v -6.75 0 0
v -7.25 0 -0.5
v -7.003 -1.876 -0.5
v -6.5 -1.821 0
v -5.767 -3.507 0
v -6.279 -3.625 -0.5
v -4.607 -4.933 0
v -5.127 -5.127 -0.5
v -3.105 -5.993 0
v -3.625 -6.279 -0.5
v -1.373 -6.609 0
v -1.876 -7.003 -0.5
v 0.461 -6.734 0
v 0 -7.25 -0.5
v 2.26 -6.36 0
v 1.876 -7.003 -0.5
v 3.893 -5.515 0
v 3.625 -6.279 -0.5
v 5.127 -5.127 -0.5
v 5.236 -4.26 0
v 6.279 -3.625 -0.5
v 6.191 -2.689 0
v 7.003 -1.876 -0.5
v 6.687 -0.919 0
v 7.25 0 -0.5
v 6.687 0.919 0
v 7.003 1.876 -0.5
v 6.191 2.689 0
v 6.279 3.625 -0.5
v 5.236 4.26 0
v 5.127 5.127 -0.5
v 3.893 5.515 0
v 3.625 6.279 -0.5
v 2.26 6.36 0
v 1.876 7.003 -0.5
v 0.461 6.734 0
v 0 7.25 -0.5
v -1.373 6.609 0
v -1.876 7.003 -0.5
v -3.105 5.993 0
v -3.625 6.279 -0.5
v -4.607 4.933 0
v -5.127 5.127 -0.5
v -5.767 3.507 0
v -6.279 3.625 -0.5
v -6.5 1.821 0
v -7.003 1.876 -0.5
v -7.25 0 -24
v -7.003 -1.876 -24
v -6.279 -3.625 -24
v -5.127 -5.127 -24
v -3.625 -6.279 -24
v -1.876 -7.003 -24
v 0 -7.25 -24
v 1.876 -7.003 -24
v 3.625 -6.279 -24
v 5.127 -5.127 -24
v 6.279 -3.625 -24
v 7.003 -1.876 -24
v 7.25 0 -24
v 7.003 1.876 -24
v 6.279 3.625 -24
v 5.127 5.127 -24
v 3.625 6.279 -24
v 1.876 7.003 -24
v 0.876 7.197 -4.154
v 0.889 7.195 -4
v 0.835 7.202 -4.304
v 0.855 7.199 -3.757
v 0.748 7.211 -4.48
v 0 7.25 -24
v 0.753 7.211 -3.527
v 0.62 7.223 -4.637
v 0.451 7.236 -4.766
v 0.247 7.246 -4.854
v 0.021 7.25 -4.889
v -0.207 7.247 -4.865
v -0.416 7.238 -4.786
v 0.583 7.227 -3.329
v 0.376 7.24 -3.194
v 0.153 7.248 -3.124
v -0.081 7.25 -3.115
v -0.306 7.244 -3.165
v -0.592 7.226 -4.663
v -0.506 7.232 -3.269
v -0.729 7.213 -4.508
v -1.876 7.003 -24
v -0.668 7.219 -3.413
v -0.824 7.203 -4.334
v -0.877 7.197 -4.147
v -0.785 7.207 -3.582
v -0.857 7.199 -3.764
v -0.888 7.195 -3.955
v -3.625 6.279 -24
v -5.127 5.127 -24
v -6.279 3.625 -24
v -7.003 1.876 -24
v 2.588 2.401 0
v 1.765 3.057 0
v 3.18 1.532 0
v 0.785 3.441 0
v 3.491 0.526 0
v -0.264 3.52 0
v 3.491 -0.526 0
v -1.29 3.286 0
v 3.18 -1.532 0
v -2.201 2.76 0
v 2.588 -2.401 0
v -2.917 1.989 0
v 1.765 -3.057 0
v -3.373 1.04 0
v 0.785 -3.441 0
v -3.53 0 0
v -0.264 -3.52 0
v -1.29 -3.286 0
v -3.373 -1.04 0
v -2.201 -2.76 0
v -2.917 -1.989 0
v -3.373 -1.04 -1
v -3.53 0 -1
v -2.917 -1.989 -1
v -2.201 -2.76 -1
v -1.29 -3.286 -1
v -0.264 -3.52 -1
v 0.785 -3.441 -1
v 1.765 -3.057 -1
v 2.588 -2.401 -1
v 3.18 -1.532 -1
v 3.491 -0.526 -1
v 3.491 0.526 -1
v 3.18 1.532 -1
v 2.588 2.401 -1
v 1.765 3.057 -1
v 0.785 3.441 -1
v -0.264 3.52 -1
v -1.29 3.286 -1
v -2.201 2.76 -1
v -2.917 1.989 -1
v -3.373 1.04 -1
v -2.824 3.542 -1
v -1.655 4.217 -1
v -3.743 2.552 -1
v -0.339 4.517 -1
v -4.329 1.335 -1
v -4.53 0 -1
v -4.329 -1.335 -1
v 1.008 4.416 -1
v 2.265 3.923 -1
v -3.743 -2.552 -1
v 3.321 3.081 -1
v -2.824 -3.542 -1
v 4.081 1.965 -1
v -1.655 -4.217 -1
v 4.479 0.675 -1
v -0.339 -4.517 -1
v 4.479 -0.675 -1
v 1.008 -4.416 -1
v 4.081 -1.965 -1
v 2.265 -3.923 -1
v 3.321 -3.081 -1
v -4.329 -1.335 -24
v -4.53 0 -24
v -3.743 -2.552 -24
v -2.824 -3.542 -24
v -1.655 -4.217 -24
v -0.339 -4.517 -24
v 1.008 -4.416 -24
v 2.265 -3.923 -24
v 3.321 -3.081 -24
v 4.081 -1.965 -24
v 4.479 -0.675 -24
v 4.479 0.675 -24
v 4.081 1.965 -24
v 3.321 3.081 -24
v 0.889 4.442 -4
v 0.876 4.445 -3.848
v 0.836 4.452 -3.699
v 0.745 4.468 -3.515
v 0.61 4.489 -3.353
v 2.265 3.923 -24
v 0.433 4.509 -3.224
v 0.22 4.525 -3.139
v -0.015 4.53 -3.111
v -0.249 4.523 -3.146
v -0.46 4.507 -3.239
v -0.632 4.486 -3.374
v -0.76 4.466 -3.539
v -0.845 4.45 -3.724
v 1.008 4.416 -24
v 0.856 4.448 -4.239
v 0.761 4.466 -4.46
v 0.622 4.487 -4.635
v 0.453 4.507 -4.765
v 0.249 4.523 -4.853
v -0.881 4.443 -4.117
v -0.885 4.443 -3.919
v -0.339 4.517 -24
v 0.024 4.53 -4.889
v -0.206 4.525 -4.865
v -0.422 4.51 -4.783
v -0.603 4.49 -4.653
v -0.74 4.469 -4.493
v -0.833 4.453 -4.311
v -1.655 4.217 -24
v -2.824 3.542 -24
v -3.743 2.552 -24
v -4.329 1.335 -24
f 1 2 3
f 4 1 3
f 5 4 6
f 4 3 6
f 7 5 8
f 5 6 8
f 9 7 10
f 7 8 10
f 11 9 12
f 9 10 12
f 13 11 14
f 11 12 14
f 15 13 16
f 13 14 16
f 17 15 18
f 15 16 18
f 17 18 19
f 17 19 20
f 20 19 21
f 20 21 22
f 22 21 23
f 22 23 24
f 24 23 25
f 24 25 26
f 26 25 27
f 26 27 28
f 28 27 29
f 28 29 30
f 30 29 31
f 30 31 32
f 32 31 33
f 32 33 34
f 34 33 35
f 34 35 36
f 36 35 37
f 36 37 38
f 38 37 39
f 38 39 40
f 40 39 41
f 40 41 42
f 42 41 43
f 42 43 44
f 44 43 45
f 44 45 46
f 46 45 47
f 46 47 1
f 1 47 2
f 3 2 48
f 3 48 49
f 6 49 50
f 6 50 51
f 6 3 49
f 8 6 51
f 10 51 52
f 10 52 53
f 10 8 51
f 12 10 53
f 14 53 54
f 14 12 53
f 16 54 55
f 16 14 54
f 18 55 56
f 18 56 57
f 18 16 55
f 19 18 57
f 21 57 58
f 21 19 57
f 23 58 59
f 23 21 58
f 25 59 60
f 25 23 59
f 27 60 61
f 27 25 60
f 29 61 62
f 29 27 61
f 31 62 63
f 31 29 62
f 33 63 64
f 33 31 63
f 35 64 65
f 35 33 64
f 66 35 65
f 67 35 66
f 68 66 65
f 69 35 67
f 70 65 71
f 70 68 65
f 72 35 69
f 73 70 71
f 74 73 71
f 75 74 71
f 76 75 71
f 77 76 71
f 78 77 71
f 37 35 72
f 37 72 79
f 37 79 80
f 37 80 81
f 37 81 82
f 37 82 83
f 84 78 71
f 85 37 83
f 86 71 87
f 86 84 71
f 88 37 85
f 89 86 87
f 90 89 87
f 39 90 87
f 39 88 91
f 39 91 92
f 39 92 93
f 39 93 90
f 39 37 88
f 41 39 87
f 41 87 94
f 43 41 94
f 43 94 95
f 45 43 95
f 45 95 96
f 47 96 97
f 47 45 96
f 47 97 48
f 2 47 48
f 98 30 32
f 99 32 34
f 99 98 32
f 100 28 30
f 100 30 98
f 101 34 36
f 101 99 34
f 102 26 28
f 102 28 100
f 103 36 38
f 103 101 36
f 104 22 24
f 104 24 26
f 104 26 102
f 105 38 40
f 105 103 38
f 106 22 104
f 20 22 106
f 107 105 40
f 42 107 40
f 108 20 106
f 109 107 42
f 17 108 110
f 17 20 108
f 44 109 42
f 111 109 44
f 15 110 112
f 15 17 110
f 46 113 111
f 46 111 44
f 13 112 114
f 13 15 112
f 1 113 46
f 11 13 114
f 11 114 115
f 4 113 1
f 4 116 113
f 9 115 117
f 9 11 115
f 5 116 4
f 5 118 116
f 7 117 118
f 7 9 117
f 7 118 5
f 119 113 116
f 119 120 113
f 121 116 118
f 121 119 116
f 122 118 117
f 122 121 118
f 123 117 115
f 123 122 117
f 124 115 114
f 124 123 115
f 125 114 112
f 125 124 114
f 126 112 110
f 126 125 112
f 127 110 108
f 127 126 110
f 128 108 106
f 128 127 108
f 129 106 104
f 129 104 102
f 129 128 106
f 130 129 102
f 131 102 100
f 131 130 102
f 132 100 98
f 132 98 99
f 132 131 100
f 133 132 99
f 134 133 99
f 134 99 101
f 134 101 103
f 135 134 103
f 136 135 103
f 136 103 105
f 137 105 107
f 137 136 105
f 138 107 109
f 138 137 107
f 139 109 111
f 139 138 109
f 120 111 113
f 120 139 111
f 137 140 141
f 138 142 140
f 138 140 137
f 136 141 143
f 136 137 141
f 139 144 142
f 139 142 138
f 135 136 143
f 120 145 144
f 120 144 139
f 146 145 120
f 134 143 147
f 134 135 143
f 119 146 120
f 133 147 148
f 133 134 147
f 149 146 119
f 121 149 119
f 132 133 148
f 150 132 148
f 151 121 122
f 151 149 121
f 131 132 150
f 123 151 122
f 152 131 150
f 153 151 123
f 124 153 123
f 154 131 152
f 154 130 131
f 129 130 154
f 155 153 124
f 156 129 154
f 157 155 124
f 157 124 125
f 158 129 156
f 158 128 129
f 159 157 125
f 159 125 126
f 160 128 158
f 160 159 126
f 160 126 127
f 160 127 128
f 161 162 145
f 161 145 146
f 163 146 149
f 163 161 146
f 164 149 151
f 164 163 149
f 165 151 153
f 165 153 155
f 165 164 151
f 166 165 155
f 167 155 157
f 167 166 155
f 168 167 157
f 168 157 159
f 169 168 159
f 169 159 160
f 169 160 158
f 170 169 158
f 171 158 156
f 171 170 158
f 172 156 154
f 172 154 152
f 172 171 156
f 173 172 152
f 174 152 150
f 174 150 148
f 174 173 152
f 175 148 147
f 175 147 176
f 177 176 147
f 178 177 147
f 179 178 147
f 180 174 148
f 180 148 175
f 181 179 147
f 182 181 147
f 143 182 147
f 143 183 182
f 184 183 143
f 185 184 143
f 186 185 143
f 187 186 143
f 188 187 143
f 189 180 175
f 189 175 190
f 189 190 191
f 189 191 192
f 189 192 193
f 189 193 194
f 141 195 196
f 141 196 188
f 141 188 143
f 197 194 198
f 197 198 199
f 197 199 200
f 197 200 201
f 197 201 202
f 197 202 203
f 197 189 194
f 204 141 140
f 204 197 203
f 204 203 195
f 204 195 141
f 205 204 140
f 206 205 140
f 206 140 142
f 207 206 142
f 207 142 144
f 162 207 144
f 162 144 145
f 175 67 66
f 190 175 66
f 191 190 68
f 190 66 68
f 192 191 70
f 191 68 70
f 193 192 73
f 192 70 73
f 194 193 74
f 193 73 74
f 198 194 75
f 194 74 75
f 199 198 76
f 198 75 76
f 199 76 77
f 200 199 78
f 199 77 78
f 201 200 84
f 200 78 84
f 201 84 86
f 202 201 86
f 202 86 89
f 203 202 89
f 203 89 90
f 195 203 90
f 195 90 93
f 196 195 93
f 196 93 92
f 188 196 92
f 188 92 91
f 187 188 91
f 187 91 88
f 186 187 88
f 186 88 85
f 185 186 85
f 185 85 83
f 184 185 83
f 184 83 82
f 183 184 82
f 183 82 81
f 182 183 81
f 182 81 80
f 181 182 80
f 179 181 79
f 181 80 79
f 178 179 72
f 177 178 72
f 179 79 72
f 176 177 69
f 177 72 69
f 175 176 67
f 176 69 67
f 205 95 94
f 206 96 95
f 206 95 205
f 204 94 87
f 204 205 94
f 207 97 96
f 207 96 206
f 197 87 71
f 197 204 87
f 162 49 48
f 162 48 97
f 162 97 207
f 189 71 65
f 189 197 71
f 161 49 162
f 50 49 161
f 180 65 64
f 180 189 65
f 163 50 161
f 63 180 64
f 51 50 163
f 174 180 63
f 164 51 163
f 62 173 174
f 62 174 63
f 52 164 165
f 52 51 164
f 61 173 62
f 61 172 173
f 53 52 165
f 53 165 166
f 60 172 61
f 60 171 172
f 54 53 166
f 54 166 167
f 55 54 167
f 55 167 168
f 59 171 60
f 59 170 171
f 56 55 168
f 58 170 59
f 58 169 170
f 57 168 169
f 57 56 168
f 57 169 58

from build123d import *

# Parameters (mm, degrees)
F_2_56_TAPPED_HOLE2_REACH  = 16.5
F_2_56_TAPPED_HOLE2_BORE_R = 0.889
CHAMFER1_SIZE              = 0.5


with BuildPart() as part:
    # Sketch1 → Revolve1 (revolve)
    with BuildSketch(Plane(origin=(0, 0, 0), x_dir=(0, 0, -1), z_dir=(1, 0, 0)), mode=Mode.PRIVATE) as revolve1_sk:
        Polygon((0, 7.25), (0, 3.53), (1, 3.53), (1, 4.53), (24, 4.53), (24, 7.25), align=None)
    revolve(revolve1_sk.sketch.rotate(Axis((0, 0, 0), (0, 0, 1)), 90), axis=Axis((0, 0, 0), (0, 0, 1)))  # turned: the seam where the file's is

    # #2-56 Tapped Hole2 bore (on position points) → #2-56 Tapped Hole2 (cut, up to next)
    with BuildSketch(Plane(origin=(0, 7.25, -4), x_dir=(1, 0, 0), z_dir=(0, 1, 0)), mode=Mode.PRIVATE) as f_2_56_tapped_hole2_sk1:
        Circle(F_2_56_TAPPED_HOLE2_BORE_R)
    f_2_56_tapped_hole2_tool1 = extrude(f_2_56_tapped_hole2_sk1.sketch, amount=-F_2_56_TAPPED_HOLE2_REACH, mode=Mode.PRIVATE) & part.part
    add(f_2_56_tapped_hole2_tool1.solids().sort_by_distance((0, 7.25, -4))[0], mode=Mode.SUBTRACT)

    # Chamfer1
    chamfer1_edges = [part.edges().sort_by_distance(p)[0] for p in [
        (7.25, 0, 0),
    ]]
    chamfer(chamfer1_edges, length=CHAMFER1_SIZE)


solid = part.part
